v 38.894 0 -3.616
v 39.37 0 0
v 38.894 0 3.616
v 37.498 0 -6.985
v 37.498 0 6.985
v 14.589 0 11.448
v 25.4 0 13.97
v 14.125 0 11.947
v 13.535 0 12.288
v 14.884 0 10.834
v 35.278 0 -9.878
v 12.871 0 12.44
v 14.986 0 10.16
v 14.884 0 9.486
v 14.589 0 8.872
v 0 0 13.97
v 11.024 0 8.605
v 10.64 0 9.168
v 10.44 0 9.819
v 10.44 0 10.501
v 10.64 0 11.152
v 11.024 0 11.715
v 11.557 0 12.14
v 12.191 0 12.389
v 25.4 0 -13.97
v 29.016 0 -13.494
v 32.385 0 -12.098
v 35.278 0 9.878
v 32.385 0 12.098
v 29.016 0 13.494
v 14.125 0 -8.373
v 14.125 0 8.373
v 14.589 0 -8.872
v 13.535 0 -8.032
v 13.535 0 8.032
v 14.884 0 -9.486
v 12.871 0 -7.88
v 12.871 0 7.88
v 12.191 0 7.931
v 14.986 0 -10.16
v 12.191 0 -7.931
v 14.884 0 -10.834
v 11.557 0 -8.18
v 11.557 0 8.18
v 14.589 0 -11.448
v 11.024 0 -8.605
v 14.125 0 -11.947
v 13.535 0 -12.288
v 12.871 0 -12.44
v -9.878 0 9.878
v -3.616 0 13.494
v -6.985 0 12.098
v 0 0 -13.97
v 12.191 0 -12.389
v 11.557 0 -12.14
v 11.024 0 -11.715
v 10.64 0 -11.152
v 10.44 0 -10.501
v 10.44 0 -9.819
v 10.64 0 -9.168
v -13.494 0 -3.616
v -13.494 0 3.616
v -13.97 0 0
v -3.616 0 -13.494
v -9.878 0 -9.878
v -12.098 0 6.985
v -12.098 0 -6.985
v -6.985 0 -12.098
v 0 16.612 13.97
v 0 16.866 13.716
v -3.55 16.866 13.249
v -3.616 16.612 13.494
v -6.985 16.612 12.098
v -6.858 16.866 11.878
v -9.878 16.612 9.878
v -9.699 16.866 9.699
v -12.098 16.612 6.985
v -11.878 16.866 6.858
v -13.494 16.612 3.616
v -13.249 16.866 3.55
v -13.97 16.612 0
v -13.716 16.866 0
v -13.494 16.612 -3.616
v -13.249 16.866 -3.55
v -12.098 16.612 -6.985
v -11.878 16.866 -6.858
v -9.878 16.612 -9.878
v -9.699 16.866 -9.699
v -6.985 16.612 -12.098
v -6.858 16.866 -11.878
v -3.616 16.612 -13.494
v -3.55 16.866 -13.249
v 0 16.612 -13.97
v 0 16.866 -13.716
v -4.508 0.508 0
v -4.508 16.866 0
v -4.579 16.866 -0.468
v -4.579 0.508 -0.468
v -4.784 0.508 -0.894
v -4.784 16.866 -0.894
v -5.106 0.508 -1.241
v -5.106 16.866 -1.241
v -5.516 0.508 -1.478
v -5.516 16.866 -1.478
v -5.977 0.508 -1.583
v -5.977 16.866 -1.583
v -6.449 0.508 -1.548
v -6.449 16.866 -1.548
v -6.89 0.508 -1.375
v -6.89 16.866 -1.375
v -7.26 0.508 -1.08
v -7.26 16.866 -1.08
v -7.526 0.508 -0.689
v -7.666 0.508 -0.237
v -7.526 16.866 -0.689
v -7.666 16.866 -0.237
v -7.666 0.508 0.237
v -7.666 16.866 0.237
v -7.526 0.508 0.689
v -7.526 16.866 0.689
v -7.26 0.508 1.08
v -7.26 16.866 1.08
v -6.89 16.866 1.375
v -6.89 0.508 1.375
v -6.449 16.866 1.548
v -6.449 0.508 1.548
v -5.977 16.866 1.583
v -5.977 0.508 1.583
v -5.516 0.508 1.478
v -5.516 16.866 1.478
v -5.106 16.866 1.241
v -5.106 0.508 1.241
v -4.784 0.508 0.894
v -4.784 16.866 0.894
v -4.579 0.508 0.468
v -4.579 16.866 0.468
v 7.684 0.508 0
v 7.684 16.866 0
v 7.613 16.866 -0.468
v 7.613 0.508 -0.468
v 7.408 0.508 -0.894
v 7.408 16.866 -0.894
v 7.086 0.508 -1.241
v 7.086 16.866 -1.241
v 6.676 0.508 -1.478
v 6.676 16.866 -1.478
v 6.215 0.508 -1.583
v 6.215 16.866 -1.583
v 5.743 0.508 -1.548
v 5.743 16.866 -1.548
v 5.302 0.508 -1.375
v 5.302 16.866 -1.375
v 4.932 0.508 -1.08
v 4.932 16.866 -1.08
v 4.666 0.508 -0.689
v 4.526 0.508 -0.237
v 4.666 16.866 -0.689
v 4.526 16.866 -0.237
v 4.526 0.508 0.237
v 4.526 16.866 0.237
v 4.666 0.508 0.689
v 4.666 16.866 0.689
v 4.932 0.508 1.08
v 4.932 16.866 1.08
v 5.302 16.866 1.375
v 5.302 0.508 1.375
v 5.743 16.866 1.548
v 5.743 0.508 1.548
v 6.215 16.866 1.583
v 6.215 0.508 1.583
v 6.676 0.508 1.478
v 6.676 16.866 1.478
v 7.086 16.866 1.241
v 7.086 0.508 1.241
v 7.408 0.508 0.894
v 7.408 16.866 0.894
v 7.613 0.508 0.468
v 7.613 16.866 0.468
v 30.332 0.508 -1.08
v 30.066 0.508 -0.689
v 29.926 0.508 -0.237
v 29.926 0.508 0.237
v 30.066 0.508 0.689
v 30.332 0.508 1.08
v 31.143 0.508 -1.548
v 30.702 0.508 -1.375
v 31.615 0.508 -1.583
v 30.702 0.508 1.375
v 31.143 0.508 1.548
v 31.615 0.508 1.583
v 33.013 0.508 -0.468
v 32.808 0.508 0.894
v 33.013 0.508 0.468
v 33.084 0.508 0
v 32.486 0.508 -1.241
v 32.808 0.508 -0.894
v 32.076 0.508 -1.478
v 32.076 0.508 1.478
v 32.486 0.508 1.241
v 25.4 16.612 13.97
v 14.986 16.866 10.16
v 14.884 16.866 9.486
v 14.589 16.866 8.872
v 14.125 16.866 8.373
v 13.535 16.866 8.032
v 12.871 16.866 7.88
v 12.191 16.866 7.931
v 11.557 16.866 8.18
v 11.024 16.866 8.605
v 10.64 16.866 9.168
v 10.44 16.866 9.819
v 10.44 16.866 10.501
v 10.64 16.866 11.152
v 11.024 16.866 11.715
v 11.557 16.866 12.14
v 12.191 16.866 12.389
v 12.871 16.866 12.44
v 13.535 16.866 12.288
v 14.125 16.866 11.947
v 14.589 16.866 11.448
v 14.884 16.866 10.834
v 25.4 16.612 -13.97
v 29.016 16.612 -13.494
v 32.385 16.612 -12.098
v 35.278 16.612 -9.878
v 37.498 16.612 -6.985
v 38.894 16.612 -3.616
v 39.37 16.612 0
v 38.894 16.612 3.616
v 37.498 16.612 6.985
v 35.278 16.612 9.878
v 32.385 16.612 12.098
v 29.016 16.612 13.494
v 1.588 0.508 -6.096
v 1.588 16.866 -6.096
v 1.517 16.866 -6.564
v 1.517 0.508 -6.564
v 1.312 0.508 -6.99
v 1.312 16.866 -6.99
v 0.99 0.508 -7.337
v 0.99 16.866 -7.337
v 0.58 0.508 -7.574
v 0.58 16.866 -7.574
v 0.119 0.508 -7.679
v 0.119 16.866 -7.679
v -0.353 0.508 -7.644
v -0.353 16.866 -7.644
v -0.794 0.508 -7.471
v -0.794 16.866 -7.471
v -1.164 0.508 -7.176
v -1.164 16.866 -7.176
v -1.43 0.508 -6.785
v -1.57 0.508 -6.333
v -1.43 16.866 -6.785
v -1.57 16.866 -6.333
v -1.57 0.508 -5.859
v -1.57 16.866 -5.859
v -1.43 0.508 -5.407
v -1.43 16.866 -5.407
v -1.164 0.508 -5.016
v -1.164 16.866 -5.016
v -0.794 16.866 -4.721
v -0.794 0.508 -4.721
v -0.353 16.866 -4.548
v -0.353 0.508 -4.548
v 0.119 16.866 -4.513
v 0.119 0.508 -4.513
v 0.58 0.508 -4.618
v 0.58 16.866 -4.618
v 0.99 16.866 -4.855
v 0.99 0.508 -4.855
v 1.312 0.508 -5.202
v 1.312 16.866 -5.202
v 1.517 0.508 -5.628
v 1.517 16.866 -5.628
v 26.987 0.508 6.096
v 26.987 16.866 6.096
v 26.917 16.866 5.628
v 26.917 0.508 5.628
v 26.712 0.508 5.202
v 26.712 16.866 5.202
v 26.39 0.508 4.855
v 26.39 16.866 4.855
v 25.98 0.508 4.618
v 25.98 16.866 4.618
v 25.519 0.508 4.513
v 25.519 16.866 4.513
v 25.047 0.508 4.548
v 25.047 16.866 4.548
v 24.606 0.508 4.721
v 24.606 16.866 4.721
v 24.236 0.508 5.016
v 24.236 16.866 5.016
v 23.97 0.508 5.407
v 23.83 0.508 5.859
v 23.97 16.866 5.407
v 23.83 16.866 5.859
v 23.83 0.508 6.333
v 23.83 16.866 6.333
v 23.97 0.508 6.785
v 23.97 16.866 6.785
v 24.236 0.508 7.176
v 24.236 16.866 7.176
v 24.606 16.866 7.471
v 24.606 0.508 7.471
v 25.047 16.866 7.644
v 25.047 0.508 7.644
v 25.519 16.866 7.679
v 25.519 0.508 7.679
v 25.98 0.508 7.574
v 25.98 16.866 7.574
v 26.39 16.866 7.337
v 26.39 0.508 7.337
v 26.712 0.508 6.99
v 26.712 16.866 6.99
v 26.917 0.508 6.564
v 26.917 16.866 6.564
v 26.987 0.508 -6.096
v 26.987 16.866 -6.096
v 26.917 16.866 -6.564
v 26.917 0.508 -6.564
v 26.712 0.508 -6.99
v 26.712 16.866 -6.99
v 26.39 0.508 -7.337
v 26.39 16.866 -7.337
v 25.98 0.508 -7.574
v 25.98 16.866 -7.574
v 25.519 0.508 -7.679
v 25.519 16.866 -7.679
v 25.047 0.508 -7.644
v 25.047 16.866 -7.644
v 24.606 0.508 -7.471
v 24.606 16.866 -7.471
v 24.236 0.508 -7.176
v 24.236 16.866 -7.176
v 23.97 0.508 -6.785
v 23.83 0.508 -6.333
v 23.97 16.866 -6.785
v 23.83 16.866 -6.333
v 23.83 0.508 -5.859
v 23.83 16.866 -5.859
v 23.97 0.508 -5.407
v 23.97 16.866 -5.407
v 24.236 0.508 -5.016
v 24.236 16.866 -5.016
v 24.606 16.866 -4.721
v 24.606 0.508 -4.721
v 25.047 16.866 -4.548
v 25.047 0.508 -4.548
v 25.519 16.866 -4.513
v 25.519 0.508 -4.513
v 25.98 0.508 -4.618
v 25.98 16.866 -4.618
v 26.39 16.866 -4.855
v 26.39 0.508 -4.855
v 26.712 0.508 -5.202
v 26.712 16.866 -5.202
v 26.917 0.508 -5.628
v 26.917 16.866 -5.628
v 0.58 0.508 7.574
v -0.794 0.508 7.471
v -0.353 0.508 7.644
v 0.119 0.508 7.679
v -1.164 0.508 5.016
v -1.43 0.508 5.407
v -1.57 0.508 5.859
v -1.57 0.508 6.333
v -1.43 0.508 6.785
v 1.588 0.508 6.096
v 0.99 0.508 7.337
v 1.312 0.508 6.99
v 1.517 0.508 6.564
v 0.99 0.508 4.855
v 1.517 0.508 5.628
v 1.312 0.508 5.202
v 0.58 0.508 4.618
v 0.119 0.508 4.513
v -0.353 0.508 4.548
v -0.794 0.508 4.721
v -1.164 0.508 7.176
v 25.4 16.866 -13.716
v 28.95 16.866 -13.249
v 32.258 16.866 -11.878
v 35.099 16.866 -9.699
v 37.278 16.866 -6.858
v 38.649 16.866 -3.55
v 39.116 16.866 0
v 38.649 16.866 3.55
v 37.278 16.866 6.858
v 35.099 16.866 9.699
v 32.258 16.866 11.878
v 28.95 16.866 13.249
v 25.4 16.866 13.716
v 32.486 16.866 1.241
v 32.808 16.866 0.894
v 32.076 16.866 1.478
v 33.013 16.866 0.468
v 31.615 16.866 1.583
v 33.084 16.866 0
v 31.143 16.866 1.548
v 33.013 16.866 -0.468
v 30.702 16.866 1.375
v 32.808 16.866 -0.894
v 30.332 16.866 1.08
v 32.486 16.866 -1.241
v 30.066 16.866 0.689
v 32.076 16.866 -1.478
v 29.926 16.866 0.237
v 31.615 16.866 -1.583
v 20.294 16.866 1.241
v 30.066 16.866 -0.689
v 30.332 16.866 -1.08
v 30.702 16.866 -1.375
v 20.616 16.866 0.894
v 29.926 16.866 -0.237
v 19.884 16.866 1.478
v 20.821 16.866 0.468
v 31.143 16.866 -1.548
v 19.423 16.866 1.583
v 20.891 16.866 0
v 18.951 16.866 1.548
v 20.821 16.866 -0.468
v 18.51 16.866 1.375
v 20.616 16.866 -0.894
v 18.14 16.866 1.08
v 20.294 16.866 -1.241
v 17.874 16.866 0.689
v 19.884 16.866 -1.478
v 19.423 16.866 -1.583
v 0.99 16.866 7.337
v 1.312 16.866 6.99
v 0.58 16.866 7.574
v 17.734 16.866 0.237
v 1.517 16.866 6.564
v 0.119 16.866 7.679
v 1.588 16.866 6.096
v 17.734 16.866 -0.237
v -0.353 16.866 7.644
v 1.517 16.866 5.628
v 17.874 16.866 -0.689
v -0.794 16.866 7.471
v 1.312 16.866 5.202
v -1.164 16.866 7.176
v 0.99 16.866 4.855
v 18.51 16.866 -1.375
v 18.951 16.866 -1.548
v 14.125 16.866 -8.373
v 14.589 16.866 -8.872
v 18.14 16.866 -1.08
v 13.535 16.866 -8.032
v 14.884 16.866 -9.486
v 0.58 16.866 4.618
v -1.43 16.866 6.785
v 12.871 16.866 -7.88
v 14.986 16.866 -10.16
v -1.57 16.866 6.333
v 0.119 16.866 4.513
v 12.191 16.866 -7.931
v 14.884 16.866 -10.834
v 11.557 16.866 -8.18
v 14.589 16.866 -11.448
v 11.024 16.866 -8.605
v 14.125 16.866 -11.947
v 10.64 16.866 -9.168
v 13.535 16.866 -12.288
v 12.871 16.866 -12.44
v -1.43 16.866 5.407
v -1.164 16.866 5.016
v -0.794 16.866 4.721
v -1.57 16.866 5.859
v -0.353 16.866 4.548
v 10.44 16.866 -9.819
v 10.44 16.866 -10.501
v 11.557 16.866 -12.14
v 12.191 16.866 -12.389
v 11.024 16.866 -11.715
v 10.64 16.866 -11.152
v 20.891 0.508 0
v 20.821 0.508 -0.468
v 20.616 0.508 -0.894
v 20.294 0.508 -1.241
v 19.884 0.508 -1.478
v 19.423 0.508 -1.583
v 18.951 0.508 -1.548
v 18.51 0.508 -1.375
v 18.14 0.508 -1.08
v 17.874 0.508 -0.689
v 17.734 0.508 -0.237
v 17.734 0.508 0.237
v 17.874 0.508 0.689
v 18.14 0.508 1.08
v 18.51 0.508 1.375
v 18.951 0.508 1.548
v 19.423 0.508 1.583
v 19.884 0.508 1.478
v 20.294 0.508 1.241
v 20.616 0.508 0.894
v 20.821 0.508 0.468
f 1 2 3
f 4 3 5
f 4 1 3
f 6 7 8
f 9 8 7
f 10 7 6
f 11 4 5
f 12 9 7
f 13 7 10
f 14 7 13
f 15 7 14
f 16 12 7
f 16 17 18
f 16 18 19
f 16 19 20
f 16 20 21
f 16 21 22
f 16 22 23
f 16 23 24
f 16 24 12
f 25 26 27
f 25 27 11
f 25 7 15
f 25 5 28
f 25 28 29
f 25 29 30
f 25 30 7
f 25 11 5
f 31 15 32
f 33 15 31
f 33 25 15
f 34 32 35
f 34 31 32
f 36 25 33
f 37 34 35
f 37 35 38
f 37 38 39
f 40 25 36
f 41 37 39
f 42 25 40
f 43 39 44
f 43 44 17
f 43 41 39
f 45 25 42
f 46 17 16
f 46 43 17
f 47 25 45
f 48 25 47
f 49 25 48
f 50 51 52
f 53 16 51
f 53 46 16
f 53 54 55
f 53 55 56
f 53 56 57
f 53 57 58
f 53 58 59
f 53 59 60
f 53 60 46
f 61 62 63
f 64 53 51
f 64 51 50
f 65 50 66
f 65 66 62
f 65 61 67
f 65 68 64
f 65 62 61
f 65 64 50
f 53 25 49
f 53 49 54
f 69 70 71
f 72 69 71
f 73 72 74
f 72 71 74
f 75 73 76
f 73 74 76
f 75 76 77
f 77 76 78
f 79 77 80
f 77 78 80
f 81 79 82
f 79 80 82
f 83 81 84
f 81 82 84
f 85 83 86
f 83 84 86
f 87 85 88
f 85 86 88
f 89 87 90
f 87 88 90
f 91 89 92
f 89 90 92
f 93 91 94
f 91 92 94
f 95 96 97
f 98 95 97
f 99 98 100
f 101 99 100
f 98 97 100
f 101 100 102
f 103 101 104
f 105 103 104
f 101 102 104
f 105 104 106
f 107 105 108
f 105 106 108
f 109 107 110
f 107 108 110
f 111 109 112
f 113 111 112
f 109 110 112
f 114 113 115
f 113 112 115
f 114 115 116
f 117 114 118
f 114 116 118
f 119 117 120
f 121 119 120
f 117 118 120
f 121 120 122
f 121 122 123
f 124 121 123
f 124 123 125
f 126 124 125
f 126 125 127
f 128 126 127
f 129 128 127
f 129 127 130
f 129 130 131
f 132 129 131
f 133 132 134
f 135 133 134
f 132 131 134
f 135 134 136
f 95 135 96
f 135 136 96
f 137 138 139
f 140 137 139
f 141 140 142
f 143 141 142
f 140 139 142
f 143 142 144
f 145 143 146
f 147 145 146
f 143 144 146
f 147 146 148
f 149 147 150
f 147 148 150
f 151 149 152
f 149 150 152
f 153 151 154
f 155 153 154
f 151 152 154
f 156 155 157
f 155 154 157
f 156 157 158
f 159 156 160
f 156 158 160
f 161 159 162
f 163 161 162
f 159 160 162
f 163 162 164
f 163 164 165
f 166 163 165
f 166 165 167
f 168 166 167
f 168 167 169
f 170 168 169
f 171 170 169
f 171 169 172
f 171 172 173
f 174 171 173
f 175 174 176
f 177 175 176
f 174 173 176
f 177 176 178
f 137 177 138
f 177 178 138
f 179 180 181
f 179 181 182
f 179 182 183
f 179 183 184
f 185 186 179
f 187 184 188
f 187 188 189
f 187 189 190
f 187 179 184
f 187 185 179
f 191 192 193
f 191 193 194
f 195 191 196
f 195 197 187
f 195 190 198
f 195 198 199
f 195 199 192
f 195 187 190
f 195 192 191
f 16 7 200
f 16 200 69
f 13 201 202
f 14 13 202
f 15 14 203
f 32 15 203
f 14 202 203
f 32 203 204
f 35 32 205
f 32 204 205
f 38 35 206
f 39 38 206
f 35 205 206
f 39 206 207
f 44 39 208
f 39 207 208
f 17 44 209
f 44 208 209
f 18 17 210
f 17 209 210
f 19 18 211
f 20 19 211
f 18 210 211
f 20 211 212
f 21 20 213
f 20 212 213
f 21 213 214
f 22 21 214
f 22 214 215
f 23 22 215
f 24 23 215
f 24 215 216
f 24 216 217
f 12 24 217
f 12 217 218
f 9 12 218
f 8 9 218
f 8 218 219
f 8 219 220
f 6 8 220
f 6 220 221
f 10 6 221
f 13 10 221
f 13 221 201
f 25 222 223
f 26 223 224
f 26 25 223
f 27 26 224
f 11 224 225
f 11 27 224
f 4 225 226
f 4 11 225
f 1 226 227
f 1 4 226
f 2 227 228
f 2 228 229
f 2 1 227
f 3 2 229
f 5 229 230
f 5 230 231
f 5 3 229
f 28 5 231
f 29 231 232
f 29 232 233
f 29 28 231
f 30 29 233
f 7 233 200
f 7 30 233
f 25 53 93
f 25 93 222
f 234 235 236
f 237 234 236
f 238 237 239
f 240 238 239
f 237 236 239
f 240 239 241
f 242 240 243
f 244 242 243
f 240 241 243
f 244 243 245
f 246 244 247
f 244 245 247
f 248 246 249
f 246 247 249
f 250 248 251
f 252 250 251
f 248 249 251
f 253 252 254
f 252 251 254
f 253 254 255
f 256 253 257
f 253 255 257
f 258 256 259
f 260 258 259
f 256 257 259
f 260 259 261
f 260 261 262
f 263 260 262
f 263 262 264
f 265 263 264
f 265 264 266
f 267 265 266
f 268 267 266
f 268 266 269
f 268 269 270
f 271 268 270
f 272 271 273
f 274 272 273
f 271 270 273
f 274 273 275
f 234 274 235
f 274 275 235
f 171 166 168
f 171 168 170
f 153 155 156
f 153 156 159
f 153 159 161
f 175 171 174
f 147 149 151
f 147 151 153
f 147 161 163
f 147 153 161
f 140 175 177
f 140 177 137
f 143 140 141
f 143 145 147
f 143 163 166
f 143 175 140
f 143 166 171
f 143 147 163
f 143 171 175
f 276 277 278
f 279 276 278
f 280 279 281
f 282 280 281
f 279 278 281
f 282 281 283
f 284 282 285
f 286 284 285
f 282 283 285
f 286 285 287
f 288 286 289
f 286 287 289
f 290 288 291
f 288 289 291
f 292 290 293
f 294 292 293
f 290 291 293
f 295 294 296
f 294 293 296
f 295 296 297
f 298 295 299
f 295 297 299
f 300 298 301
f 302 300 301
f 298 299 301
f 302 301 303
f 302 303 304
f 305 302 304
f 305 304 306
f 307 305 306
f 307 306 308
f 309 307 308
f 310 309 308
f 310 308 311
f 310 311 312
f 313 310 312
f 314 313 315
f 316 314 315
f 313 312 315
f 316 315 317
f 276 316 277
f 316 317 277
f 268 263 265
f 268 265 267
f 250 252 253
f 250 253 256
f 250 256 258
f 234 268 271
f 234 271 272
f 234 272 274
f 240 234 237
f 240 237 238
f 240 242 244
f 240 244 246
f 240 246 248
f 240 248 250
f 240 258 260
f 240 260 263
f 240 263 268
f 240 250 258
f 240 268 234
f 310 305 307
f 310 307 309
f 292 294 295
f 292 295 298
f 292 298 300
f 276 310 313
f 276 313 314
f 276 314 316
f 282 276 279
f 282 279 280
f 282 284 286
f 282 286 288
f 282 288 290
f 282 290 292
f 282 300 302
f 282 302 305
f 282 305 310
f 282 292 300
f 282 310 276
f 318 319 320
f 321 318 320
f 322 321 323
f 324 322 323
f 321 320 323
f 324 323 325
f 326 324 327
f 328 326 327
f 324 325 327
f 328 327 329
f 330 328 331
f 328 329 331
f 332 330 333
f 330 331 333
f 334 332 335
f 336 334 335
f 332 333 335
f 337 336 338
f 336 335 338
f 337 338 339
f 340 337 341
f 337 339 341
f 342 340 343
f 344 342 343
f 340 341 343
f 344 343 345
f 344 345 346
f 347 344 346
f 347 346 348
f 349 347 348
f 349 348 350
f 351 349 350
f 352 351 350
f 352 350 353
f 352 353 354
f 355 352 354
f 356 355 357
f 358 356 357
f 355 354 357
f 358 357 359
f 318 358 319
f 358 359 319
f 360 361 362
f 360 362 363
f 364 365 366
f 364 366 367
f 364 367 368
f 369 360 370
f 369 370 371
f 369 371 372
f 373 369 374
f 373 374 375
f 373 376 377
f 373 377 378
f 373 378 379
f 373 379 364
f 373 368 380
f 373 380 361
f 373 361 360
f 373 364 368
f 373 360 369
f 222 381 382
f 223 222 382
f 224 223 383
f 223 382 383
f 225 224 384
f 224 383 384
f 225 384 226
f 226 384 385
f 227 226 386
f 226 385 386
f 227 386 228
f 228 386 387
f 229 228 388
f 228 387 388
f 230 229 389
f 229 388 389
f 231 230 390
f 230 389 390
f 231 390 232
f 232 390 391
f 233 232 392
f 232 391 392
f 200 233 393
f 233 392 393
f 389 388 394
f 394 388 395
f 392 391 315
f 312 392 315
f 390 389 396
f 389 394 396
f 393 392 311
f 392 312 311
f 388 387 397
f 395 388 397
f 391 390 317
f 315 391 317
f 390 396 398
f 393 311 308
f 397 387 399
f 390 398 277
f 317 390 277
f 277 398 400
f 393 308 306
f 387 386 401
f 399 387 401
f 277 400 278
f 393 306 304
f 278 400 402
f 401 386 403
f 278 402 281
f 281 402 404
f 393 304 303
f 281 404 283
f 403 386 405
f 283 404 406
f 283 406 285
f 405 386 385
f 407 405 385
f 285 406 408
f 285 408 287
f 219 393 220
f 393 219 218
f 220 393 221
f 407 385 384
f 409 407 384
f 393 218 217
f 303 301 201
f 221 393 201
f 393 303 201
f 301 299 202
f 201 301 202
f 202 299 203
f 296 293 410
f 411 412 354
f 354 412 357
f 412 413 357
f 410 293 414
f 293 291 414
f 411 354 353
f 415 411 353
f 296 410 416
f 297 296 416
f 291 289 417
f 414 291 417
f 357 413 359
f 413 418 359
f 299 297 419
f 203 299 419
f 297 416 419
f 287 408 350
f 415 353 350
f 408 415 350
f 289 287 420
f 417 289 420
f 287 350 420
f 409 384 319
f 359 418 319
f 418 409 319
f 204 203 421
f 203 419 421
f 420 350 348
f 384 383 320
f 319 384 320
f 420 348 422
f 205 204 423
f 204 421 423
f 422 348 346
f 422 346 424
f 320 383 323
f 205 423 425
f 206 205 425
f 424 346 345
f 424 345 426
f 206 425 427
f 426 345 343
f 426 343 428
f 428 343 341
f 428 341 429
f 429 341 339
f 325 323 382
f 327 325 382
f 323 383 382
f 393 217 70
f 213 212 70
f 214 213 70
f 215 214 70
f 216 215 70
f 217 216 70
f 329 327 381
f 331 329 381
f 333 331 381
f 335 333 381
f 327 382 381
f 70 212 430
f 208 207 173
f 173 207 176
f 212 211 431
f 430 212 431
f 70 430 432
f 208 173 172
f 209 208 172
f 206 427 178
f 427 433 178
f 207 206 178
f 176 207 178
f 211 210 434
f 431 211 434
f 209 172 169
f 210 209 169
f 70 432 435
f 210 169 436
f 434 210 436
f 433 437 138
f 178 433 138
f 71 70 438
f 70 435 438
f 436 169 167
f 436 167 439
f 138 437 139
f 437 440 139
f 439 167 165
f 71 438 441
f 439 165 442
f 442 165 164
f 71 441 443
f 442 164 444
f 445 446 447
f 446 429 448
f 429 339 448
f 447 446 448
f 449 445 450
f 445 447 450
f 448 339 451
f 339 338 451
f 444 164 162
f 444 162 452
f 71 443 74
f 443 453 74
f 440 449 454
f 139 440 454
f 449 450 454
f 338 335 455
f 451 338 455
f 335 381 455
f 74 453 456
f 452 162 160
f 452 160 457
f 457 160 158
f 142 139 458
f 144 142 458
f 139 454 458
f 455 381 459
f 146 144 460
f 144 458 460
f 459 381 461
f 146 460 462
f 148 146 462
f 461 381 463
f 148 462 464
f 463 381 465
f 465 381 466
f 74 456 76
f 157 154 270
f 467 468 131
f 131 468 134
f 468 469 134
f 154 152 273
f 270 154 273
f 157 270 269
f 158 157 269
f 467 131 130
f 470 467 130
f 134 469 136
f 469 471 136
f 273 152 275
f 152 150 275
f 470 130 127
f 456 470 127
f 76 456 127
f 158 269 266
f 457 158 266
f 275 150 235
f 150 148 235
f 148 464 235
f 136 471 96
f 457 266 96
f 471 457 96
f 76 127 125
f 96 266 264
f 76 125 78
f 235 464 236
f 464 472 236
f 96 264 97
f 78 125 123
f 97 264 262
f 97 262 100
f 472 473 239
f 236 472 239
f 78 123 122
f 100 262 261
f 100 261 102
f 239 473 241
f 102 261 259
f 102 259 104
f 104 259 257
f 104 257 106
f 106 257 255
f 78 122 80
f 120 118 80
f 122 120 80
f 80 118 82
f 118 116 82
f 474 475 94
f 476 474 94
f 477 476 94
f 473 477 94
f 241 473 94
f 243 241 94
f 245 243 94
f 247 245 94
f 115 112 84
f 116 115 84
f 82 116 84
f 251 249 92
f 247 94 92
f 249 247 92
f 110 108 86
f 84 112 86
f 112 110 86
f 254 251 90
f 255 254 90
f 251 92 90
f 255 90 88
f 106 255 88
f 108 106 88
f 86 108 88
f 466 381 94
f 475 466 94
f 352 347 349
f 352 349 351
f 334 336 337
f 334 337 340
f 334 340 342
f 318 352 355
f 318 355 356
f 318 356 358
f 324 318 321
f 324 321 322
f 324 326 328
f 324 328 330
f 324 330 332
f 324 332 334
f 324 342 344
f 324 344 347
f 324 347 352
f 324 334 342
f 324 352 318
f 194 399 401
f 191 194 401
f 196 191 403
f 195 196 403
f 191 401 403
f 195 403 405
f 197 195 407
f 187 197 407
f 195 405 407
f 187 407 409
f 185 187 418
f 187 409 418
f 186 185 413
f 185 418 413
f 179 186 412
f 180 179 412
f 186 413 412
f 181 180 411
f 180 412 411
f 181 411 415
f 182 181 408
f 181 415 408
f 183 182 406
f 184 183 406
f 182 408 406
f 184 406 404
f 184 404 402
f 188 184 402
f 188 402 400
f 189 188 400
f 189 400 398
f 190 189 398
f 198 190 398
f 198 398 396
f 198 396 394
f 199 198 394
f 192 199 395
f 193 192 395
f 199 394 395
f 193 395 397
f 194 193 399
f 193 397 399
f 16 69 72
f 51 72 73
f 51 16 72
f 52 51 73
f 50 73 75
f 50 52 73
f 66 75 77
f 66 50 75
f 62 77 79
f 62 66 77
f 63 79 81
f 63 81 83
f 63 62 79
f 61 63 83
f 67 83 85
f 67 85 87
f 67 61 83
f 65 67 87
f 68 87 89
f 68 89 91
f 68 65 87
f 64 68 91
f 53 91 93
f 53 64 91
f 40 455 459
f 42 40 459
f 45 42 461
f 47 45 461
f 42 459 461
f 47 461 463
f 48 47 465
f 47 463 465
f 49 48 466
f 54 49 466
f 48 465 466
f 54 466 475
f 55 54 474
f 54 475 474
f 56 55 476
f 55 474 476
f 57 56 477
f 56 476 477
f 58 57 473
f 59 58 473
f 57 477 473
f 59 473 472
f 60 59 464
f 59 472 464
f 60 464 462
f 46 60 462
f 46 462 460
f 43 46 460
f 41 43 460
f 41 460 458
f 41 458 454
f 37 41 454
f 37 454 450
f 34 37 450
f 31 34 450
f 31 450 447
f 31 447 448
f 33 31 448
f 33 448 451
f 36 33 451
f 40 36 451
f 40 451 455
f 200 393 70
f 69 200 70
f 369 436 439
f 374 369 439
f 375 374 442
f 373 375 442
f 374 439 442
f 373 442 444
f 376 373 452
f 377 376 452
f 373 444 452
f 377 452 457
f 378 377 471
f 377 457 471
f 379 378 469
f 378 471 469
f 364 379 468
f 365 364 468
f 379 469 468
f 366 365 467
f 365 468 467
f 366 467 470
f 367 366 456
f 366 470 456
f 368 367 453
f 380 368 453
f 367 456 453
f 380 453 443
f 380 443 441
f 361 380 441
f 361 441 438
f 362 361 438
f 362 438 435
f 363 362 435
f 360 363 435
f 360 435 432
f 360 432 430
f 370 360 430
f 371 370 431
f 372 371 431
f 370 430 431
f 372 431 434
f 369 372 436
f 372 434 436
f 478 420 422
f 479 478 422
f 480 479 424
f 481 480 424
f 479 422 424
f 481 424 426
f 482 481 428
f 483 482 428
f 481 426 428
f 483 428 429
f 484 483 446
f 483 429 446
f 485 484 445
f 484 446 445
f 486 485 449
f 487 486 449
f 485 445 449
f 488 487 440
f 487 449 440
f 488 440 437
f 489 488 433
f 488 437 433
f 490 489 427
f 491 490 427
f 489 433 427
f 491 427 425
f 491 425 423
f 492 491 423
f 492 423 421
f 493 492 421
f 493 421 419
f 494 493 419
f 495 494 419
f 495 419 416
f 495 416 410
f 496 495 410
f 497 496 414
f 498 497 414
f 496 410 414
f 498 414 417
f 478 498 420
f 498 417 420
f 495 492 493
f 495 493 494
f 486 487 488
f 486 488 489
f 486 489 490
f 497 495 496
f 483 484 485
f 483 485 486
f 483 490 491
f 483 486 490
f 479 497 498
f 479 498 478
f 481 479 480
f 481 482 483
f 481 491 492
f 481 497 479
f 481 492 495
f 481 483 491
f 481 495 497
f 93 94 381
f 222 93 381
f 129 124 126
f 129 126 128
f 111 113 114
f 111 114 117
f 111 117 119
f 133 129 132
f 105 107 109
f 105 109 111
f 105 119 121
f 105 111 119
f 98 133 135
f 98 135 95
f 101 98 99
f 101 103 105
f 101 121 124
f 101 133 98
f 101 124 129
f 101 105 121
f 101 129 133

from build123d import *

# Parameters (mm, degrees)
BOSS_EXTRUDE1_DEPTH = 16.8656
CHAMFER1_SIZE       = 0.254
SKETCH3_R           = 1.5875
CUT_EXTRUDE1_DEPTH  = 16.3576
SKETCH4_R           = 2.286
CUT_EXTRUDE2_DEPTH  = 17.8656


with BuildPart() as part:
    # Sketch1 → Boss-Extrude1 (new body)
    with BuildSketch(Plane(origin=(0, 0, 0), x_dir=(1, 0, 0), z_dir=(0, 1, 0))):
        with BuildLine():
            Line((0, 13.97), (25.4, 13.97))
            ThreePointArc((25.4, 13.97), (39.37, 0), (25.4, -13.97))
            Line((25.4, -13.97), (0, -13.97))
            ThreePointArc((0, -13.97), (-13.97, 0), (0, 13.97))
        make_face()
    extrude(amount=BOSS_EXTRUDE1_DEPTH)

    # Chamfer1
    chamfer1_edges = [part.edges().sort_by_distance(p)[0] for p in [
        (39.37, 16.8656, 0),
        (12.7, 16.8656, -13.97),
        (-13.97, 16.8656, 0),
        (12.7, 16.8656, 13.97),
    ]]
    chamfer(chamfer1_edges, length=CHAMFER1_SIZE)

    # Sketch3 → Cut-Extrude1 (cut)
    with BuildSketch(Plane(origin=(0, 16.8656, 0), x_dir=(1, 0, 0), z_dir=(0, 1, 0))):
        with Locations((25.4, 6.096)):
            Circle(SKETCH3_R)
        with Locations((31.496, 0)):
            Circle(SKETCH3_R)
        with Locations((25.4, -6.096)):
            Circle(SKETCH3_R)
        with Locations((19.304, 0)):
            Circle(SKETCH3_R)
        with Locations((-6.096, 0)):
            Circle(SKETCH3_R)
        with Locations((6.096, 0)):
            Circle(SKETCH3_R)
        with Locations((0, -6.096)):
            Circle(SKETCH3_R)
        with Locations((0, 6.096)):
            Circle(SKETCH3_R)
    extrude(amount=-CUT_EXTRUDE1_DEPTH, mode=Mode.SUBTRACT)

    # Sketch4 → Cut-Extrude2 (cut, through all)
    with BuildSketch(Plane(origin=(0, 16.8656, 0), x_dir=(1, 0, 0), z_dir=(0, 1, 0))):
        with Locations((12.7, 10.16)):
            Circle(SKETCH4_R)
        with Locations((12.7, -10.16)):
            Circle(SKETCH4_R)
    extrude(amount=-CUT_EXTRUDE2_DEPTH, mode=Mode.SUBTRACT)


solid = part.part
